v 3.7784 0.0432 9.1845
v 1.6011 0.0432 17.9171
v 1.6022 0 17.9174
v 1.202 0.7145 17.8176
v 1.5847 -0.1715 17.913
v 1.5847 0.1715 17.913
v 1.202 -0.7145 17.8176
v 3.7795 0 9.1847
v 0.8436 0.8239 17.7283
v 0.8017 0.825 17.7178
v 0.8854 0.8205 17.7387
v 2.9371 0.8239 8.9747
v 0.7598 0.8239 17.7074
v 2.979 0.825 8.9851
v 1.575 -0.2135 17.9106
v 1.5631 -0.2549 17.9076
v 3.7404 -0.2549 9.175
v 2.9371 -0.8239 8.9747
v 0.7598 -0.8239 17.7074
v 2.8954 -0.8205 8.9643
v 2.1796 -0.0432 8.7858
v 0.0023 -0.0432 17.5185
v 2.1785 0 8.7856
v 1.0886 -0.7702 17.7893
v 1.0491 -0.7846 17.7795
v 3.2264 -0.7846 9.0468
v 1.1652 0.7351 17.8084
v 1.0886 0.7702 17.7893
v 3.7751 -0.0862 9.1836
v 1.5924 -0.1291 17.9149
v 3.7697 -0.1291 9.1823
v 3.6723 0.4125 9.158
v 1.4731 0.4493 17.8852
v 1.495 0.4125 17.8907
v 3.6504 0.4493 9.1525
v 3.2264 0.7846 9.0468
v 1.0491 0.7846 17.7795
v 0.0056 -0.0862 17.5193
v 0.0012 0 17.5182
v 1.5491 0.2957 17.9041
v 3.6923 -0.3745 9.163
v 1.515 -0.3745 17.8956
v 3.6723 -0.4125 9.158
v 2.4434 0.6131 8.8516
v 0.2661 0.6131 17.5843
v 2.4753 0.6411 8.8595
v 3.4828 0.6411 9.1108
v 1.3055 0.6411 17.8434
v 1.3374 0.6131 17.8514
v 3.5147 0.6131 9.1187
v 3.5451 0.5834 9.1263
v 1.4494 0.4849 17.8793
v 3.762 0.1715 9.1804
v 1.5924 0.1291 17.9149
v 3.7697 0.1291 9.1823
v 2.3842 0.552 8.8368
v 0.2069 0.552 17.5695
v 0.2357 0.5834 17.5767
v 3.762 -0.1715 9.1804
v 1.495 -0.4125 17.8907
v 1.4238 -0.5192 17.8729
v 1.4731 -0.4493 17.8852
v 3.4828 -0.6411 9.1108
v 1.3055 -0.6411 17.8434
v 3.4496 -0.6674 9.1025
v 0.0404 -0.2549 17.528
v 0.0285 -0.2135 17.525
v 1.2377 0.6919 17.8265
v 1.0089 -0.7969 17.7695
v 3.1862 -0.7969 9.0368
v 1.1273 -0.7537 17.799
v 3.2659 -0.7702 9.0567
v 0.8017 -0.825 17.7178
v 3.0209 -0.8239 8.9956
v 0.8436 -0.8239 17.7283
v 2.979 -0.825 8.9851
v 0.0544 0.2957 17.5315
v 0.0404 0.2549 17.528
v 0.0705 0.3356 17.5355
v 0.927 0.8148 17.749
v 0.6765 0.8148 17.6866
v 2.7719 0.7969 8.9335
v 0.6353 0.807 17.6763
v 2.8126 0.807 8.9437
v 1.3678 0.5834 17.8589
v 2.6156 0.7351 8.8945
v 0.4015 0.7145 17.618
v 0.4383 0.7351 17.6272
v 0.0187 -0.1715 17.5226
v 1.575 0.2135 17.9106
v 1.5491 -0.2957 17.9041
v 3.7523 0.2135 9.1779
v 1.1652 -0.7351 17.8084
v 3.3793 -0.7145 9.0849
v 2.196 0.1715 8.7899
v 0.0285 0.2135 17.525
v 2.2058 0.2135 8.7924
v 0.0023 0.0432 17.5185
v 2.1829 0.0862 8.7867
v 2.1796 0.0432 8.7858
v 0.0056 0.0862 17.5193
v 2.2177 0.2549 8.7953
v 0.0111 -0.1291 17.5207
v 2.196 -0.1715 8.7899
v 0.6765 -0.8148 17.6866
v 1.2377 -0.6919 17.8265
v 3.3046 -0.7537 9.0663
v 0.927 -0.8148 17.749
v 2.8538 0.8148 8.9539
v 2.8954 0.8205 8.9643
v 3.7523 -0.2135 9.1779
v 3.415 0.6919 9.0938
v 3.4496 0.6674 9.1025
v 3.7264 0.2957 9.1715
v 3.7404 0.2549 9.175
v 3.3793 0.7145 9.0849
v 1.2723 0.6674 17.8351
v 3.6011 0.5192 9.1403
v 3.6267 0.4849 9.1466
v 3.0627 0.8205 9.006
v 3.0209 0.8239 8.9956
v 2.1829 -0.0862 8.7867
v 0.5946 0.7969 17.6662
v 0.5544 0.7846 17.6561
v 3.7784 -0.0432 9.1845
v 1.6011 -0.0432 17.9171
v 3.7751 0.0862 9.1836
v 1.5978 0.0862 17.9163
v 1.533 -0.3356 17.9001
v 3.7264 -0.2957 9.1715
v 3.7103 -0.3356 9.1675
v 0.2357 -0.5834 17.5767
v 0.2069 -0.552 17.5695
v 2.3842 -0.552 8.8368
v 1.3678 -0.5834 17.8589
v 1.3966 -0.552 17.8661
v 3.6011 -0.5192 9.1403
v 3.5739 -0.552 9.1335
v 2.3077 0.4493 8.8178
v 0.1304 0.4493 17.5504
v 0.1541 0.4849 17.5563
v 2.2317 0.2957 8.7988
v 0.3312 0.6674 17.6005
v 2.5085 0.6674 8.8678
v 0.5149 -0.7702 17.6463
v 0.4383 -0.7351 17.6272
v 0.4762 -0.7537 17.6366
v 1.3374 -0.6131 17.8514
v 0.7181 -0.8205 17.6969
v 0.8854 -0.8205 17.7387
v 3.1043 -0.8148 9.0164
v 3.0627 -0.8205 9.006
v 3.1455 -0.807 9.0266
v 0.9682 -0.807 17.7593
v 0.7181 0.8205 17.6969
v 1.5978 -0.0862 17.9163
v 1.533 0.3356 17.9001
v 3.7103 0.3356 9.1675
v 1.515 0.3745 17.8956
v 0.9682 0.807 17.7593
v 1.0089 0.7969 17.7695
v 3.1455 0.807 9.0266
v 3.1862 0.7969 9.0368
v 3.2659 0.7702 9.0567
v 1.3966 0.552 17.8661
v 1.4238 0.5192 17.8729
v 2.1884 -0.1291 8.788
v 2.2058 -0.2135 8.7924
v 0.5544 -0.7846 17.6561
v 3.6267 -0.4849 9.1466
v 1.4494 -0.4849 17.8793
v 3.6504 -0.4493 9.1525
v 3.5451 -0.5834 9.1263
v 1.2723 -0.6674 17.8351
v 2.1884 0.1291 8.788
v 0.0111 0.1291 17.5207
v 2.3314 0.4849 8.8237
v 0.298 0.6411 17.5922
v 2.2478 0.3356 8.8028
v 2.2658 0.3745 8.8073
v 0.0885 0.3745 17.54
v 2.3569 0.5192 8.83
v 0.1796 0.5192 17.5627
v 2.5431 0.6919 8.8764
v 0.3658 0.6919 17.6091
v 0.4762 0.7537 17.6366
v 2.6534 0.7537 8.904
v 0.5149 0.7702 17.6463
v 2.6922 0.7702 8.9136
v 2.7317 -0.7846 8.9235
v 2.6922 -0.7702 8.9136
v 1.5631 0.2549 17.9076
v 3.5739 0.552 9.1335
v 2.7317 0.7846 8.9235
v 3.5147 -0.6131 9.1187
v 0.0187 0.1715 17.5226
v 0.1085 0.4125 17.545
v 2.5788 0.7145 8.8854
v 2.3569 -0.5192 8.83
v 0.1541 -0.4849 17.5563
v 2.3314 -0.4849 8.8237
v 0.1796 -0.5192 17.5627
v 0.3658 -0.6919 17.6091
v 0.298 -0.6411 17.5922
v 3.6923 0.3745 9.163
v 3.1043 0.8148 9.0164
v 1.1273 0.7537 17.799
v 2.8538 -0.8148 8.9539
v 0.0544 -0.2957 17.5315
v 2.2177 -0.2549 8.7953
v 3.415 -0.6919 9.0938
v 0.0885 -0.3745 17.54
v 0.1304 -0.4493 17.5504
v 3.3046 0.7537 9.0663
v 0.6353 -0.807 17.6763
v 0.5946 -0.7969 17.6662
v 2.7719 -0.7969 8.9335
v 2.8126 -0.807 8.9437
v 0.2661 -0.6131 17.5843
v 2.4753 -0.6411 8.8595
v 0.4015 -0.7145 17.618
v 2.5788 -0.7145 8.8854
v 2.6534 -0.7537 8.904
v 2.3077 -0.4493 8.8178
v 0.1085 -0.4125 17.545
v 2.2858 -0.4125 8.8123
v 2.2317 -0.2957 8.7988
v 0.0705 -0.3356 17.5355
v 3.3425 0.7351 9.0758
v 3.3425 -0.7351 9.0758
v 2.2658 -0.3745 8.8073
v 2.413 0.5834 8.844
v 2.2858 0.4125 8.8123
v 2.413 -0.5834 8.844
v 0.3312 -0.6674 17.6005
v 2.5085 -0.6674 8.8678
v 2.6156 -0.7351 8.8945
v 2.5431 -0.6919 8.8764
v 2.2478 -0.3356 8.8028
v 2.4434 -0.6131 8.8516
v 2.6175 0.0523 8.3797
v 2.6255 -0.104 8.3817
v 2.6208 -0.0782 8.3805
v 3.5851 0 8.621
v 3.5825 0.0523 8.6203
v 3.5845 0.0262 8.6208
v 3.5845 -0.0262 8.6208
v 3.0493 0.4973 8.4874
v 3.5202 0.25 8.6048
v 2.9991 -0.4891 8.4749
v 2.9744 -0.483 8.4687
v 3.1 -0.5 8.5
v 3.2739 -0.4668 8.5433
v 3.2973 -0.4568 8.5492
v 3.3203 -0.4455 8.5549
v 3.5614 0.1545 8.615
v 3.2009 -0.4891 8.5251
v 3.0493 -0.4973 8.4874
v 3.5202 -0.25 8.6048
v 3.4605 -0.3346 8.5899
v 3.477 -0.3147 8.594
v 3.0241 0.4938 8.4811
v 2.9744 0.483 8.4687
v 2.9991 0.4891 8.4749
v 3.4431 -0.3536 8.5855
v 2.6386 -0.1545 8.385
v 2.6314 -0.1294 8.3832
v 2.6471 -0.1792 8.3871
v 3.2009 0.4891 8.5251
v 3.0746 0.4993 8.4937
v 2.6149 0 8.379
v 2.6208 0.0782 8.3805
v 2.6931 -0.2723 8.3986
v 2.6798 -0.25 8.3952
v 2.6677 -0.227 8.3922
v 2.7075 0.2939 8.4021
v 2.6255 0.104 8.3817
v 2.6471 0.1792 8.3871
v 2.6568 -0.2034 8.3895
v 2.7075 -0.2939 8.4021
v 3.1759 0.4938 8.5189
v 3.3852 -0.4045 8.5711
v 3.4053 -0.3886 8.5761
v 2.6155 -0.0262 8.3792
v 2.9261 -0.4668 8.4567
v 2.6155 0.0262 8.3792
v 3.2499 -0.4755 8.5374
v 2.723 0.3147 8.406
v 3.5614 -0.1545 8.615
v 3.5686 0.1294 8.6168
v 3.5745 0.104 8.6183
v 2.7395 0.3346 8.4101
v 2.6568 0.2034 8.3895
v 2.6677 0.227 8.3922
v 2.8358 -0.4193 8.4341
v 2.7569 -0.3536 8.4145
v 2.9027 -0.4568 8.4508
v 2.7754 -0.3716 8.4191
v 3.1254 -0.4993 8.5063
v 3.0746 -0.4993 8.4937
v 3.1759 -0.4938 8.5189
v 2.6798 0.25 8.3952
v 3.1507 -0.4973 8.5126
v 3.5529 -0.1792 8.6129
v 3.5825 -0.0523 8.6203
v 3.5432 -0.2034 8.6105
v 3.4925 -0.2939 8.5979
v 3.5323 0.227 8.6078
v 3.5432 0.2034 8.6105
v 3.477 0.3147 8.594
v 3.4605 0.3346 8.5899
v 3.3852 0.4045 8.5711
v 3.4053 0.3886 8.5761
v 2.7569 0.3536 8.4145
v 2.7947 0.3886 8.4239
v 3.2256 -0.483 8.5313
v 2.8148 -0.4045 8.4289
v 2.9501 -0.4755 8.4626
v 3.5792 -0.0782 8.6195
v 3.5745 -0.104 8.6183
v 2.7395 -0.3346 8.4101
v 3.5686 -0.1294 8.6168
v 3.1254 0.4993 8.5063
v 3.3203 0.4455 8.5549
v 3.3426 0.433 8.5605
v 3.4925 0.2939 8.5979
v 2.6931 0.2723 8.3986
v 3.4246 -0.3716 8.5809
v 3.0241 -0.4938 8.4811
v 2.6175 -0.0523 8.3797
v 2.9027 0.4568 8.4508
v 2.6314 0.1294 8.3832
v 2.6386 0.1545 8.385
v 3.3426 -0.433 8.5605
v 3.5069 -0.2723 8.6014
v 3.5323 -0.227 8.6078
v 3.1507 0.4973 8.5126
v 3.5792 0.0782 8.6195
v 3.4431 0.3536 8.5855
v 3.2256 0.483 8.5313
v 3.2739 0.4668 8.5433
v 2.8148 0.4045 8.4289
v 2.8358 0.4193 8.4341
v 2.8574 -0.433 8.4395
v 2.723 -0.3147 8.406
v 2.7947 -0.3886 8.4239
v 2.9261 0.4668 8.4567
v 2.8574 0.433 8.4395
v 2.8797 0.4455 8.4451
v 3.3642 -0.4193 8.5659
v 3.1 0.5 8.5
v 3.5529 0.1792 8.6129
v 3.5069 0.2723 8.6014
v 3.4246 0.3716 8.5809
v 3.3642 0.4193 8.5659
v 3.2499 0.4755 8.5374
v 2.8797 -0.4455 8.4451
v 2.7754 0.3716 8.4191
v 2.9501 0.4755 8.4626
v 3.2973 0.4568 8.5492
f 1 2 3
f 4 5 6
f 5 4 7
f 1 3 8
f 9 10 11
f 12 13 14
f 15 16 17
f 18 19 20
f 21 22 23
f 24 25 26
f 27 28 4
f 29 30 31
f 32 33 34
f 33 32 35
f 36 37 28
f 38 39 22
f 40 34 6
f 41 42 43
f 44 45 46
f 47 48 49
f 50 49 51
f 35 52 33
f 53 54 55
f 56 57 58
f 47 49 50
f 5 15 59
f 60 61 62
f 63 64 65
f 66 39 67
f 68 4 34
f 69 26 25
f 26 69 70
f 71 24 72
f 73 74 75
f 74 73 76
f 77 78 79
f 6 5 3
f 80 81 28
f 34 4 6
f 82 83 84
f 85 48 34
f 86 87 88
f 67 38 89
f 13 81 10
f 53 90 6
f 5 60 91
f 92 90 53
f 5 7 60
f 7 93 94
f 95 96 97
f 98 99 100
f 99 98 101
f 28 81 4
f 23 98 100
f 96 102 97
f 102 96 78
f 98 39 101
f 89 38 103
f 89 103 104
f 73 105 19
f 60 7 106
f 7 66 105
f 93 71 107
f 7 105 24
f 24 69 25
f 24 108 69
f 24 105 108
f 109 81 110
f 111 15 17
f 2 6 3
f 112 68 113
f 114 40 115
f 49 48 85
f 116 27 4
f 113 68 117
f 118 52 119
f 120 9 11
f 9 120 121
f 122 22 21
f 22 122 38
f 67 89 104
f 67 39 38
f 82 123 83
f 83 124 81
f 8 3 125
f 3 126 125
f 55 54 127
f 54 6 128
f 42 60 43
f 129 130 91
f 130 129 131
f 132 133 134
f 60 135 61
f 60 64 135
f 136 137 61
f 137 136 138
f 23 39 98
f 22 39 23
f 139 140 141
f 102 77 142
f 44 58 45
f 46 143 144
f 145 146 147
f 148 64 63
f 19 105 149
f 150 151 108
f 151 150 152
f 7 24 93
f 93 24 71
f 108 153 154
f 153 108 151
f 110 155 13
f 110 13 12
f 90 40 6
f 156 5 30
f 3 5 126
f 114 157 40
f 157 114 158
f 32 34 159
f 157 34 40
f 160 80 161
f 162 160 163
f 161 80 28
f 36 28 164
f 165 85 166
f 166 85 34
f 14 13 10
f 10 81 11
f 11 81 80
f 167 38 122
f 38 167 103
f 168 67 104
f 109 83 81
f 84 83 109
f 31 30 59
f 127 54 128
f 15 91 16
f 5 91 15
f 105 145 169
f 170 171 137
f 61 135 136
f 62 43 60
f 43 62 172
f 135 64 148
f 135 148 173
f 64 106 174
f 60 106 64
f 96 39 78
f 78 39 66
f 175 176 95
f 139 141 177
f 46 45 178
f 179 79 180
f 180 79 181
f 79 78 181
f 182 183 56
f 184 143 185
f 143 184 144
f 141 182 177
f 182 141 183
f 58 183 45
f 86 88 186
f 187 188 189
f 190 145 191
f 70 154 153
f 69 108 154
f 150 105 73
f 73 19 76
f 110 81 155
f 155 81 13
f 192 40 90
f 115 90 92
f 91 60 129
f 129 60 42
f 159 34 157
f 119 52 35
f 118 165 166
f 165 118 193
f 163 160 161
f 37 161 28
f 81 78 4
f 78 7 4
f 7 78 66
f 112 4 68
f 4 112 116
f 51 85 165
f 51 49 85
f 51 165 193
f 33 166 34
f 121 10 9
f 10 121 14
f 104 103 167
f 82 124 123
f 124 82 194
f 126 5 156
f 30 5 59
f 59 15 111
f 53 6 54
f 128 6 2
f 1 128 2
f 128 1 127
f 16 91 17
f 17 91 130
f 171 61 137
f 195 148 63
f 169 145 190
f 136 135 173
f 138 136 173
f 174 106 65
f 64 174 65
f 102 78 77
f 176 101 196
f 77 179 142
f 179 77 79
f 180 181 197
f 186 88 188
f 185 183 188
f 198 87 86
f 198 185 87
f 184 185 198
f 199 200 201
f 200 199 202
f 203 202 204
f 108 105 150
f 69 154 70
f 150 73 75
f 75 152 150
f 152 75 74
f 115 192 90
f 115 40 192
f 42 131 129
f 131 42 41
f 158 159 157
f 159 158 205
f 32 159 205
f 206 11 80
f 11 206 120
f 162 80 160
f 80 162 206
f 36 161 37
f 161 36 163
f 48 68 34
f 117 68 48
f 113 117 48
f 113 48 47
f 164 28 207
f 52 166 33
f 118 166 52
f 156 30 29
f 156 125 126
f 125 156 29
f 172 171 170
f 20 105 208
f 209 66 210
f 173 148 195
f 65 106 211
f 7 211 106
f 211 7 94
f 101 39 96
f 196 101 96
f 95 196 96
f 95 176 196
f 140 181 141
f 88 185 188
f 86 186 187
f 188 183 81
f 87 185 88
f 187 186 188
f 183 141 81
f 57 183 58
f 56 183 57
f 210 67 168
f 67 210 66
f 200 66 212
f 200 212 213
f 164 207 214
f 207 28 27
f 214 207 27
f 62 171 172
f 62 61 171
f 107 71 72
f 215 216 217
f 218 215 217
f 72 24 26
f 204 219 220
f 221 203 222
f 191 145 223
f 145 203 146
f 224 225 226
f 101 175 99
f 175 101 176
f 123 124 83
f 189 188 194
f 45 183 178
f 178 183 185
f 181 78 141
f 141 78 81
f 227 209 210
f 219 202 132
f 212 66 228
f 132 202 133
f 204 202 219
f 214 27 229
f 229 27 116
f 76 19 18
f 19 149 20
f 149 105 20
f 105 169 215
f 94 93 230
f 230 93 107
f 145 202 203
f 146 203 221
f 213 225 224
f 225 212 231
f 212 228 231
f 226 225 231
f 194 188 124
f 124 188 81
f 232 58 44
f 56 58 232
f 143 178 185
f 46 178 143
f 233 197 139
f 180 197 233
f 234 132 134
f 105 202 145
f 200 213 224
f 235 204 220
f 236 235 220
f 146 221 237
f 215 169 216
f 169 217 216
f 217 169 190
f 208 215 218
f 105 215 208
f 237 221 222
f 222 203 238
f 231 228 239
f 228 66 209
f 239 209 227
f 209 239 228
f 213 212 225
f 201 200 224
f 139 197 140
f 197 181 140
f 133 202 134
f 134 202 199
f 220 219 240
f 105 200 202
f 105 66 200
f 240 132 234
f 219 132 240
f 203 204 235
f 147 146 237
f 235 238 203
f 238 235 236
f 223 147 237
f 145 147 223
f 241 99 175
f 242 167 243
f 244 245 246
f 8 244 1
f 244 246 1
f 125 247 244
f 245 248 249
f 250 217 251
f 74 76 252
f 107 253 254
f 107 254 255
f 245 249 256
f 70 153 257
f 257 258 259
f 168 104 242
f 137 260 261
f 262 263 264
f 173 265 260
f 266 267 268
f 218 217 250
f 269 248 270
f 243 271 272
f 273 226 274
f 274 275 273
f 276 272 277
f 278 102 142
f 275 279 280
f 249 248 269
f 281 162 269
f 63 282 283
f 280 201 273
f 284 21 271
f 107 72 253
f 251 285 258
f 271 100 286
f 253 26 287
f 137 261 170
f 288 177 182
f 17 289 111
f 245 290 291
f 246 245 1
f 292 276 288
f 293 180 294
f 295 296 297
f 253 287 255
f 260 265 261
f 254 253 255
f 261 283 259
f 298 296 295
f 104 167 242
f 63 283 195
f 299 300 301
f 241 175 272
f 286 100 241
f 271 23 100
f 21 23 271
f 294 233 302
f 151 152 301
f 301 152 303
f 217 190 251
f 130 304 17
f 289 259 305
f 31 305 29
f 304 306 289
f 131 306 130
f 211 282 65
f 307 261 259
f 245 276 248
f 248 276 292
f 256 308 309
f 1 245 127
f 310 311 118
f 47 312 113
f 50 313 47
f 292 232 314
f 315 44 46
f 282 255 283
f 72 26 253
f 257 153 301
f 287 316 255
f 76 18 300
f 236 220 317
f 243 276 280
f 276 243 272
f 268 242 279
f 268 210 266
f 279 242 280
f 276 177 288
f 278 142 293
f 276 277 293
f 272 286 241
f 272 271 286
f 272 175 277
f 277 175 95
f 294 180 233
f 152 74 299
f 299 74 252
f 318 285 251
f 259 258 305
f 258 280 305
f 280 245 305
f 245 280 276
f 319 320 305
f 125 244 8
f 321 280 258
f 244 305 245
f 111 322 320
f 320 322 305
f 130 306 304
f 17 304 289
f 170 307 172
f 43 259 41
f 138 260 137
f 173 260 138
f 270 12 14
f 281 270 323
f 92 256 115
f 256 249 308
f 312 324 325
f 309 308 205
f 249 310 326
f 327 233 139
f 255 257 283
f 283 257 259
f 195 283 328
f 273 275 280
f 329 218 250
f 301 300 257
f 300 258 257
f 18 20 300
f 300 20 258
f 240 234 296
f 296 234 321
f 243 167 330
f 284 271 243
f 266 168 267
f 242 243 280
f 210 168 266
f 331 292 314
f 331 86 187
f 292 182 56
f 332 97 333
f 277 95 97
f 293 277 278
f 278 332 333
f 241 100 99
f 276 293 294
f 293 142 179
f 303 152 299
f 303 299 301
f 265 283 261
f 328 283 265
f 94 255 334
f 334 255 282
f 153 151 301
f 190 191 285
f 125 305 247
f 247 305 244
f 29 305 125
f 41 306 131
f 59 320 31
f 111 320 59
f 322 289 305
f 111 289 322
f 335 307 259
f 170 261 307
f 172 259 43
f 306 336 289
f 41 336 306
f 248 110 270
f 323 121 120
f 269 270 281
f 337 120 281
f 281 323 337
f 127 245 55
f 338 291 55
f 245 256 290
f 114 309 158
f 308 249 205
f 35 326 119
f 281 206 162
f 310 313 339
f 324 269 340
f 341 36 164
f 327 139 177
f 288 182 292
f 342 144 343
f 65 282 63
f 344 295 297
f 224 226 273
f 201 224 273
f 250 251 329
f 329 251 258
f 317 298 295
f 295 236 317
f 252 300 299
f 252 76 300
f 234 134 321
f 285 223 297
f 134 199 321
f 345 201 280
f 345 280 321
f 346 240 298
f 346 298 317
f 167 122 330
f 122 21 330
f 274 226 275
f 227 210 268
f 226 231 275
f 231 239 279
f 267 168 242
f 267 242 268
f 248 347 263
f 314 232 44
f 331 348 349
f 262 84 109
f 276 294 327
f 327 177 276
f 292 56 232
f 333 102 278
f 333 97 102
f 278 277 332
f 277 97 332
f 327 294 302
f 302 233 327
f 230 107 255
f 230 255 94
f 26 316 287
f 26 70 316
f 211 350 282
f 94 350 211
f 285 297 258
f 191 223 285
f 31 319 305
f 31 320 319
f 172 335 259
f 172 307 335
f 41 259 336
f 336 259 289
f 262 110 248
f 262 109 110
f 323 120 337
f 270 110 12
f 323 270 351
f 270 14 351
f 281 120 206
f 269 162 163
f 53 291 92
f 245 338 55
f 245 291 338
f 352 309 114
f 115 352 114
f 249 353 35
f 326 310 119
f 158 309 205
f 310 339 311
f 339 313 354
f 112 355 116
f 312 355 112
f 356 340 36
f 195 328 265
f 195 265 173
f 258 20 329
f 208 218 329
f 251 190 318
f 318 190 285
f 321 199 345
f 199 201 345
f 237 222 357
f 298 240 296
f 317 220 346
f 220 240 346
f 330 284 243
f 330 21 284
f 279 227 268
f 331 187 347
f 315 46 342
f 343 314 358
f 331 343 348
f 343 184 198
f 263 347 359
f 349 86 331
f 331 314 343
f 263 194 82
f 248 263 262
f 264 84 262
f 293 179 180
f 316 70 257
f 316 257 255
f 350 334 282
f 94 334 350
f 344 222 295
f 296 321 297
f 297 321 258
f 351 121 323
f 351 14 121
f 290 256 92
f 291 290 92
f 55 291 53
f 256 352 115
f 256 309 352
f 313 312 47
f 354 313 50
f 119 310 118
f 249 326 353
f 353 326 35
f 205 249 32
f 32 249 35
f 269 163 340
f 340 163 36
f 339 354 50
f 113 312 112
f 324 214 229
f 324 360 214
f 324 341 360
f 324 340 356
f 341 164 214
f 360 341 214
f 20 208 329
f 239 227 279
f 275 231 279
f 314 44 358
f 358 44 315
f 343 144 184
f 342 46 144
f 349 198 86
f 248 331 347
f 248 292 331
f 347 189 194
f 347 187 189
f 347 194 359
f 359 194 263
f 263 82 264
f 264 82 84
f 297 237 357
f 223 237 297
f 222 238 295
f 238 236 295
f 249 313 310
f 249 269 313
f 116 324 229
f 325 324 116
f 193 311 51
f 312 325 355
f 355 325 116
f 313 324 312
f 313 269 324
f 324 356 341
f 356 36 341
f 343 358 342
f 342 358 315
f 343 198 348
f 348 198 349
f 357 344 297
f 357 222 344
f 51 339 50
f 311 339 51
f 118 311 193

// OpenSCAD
$fn=120;

module smiski() {
    union() {
        translate([0,0,-1]) import("/home/gabe/Documents/3d printing/smiski-fixed.3mf");
        translate([3.1,0,8.5]) rotate([0,-14,0]) translate([0,0,.5]) cylinder(d=1.65, h=9);
        translate([3.1,0,8.5]) rotate([0,-14,0]) cylinder(d1=1, d2=1.65, h=.5);
        }
}

module back() {
    difference() {
        translate([-1,0,-1]) cube([11,3,18]);
        smiski();
    }
}

module front() {
    difference() {
        translate([-1,-3,-1]) cube([11,3,18]);
        smiski();
    }
}

smiski();
